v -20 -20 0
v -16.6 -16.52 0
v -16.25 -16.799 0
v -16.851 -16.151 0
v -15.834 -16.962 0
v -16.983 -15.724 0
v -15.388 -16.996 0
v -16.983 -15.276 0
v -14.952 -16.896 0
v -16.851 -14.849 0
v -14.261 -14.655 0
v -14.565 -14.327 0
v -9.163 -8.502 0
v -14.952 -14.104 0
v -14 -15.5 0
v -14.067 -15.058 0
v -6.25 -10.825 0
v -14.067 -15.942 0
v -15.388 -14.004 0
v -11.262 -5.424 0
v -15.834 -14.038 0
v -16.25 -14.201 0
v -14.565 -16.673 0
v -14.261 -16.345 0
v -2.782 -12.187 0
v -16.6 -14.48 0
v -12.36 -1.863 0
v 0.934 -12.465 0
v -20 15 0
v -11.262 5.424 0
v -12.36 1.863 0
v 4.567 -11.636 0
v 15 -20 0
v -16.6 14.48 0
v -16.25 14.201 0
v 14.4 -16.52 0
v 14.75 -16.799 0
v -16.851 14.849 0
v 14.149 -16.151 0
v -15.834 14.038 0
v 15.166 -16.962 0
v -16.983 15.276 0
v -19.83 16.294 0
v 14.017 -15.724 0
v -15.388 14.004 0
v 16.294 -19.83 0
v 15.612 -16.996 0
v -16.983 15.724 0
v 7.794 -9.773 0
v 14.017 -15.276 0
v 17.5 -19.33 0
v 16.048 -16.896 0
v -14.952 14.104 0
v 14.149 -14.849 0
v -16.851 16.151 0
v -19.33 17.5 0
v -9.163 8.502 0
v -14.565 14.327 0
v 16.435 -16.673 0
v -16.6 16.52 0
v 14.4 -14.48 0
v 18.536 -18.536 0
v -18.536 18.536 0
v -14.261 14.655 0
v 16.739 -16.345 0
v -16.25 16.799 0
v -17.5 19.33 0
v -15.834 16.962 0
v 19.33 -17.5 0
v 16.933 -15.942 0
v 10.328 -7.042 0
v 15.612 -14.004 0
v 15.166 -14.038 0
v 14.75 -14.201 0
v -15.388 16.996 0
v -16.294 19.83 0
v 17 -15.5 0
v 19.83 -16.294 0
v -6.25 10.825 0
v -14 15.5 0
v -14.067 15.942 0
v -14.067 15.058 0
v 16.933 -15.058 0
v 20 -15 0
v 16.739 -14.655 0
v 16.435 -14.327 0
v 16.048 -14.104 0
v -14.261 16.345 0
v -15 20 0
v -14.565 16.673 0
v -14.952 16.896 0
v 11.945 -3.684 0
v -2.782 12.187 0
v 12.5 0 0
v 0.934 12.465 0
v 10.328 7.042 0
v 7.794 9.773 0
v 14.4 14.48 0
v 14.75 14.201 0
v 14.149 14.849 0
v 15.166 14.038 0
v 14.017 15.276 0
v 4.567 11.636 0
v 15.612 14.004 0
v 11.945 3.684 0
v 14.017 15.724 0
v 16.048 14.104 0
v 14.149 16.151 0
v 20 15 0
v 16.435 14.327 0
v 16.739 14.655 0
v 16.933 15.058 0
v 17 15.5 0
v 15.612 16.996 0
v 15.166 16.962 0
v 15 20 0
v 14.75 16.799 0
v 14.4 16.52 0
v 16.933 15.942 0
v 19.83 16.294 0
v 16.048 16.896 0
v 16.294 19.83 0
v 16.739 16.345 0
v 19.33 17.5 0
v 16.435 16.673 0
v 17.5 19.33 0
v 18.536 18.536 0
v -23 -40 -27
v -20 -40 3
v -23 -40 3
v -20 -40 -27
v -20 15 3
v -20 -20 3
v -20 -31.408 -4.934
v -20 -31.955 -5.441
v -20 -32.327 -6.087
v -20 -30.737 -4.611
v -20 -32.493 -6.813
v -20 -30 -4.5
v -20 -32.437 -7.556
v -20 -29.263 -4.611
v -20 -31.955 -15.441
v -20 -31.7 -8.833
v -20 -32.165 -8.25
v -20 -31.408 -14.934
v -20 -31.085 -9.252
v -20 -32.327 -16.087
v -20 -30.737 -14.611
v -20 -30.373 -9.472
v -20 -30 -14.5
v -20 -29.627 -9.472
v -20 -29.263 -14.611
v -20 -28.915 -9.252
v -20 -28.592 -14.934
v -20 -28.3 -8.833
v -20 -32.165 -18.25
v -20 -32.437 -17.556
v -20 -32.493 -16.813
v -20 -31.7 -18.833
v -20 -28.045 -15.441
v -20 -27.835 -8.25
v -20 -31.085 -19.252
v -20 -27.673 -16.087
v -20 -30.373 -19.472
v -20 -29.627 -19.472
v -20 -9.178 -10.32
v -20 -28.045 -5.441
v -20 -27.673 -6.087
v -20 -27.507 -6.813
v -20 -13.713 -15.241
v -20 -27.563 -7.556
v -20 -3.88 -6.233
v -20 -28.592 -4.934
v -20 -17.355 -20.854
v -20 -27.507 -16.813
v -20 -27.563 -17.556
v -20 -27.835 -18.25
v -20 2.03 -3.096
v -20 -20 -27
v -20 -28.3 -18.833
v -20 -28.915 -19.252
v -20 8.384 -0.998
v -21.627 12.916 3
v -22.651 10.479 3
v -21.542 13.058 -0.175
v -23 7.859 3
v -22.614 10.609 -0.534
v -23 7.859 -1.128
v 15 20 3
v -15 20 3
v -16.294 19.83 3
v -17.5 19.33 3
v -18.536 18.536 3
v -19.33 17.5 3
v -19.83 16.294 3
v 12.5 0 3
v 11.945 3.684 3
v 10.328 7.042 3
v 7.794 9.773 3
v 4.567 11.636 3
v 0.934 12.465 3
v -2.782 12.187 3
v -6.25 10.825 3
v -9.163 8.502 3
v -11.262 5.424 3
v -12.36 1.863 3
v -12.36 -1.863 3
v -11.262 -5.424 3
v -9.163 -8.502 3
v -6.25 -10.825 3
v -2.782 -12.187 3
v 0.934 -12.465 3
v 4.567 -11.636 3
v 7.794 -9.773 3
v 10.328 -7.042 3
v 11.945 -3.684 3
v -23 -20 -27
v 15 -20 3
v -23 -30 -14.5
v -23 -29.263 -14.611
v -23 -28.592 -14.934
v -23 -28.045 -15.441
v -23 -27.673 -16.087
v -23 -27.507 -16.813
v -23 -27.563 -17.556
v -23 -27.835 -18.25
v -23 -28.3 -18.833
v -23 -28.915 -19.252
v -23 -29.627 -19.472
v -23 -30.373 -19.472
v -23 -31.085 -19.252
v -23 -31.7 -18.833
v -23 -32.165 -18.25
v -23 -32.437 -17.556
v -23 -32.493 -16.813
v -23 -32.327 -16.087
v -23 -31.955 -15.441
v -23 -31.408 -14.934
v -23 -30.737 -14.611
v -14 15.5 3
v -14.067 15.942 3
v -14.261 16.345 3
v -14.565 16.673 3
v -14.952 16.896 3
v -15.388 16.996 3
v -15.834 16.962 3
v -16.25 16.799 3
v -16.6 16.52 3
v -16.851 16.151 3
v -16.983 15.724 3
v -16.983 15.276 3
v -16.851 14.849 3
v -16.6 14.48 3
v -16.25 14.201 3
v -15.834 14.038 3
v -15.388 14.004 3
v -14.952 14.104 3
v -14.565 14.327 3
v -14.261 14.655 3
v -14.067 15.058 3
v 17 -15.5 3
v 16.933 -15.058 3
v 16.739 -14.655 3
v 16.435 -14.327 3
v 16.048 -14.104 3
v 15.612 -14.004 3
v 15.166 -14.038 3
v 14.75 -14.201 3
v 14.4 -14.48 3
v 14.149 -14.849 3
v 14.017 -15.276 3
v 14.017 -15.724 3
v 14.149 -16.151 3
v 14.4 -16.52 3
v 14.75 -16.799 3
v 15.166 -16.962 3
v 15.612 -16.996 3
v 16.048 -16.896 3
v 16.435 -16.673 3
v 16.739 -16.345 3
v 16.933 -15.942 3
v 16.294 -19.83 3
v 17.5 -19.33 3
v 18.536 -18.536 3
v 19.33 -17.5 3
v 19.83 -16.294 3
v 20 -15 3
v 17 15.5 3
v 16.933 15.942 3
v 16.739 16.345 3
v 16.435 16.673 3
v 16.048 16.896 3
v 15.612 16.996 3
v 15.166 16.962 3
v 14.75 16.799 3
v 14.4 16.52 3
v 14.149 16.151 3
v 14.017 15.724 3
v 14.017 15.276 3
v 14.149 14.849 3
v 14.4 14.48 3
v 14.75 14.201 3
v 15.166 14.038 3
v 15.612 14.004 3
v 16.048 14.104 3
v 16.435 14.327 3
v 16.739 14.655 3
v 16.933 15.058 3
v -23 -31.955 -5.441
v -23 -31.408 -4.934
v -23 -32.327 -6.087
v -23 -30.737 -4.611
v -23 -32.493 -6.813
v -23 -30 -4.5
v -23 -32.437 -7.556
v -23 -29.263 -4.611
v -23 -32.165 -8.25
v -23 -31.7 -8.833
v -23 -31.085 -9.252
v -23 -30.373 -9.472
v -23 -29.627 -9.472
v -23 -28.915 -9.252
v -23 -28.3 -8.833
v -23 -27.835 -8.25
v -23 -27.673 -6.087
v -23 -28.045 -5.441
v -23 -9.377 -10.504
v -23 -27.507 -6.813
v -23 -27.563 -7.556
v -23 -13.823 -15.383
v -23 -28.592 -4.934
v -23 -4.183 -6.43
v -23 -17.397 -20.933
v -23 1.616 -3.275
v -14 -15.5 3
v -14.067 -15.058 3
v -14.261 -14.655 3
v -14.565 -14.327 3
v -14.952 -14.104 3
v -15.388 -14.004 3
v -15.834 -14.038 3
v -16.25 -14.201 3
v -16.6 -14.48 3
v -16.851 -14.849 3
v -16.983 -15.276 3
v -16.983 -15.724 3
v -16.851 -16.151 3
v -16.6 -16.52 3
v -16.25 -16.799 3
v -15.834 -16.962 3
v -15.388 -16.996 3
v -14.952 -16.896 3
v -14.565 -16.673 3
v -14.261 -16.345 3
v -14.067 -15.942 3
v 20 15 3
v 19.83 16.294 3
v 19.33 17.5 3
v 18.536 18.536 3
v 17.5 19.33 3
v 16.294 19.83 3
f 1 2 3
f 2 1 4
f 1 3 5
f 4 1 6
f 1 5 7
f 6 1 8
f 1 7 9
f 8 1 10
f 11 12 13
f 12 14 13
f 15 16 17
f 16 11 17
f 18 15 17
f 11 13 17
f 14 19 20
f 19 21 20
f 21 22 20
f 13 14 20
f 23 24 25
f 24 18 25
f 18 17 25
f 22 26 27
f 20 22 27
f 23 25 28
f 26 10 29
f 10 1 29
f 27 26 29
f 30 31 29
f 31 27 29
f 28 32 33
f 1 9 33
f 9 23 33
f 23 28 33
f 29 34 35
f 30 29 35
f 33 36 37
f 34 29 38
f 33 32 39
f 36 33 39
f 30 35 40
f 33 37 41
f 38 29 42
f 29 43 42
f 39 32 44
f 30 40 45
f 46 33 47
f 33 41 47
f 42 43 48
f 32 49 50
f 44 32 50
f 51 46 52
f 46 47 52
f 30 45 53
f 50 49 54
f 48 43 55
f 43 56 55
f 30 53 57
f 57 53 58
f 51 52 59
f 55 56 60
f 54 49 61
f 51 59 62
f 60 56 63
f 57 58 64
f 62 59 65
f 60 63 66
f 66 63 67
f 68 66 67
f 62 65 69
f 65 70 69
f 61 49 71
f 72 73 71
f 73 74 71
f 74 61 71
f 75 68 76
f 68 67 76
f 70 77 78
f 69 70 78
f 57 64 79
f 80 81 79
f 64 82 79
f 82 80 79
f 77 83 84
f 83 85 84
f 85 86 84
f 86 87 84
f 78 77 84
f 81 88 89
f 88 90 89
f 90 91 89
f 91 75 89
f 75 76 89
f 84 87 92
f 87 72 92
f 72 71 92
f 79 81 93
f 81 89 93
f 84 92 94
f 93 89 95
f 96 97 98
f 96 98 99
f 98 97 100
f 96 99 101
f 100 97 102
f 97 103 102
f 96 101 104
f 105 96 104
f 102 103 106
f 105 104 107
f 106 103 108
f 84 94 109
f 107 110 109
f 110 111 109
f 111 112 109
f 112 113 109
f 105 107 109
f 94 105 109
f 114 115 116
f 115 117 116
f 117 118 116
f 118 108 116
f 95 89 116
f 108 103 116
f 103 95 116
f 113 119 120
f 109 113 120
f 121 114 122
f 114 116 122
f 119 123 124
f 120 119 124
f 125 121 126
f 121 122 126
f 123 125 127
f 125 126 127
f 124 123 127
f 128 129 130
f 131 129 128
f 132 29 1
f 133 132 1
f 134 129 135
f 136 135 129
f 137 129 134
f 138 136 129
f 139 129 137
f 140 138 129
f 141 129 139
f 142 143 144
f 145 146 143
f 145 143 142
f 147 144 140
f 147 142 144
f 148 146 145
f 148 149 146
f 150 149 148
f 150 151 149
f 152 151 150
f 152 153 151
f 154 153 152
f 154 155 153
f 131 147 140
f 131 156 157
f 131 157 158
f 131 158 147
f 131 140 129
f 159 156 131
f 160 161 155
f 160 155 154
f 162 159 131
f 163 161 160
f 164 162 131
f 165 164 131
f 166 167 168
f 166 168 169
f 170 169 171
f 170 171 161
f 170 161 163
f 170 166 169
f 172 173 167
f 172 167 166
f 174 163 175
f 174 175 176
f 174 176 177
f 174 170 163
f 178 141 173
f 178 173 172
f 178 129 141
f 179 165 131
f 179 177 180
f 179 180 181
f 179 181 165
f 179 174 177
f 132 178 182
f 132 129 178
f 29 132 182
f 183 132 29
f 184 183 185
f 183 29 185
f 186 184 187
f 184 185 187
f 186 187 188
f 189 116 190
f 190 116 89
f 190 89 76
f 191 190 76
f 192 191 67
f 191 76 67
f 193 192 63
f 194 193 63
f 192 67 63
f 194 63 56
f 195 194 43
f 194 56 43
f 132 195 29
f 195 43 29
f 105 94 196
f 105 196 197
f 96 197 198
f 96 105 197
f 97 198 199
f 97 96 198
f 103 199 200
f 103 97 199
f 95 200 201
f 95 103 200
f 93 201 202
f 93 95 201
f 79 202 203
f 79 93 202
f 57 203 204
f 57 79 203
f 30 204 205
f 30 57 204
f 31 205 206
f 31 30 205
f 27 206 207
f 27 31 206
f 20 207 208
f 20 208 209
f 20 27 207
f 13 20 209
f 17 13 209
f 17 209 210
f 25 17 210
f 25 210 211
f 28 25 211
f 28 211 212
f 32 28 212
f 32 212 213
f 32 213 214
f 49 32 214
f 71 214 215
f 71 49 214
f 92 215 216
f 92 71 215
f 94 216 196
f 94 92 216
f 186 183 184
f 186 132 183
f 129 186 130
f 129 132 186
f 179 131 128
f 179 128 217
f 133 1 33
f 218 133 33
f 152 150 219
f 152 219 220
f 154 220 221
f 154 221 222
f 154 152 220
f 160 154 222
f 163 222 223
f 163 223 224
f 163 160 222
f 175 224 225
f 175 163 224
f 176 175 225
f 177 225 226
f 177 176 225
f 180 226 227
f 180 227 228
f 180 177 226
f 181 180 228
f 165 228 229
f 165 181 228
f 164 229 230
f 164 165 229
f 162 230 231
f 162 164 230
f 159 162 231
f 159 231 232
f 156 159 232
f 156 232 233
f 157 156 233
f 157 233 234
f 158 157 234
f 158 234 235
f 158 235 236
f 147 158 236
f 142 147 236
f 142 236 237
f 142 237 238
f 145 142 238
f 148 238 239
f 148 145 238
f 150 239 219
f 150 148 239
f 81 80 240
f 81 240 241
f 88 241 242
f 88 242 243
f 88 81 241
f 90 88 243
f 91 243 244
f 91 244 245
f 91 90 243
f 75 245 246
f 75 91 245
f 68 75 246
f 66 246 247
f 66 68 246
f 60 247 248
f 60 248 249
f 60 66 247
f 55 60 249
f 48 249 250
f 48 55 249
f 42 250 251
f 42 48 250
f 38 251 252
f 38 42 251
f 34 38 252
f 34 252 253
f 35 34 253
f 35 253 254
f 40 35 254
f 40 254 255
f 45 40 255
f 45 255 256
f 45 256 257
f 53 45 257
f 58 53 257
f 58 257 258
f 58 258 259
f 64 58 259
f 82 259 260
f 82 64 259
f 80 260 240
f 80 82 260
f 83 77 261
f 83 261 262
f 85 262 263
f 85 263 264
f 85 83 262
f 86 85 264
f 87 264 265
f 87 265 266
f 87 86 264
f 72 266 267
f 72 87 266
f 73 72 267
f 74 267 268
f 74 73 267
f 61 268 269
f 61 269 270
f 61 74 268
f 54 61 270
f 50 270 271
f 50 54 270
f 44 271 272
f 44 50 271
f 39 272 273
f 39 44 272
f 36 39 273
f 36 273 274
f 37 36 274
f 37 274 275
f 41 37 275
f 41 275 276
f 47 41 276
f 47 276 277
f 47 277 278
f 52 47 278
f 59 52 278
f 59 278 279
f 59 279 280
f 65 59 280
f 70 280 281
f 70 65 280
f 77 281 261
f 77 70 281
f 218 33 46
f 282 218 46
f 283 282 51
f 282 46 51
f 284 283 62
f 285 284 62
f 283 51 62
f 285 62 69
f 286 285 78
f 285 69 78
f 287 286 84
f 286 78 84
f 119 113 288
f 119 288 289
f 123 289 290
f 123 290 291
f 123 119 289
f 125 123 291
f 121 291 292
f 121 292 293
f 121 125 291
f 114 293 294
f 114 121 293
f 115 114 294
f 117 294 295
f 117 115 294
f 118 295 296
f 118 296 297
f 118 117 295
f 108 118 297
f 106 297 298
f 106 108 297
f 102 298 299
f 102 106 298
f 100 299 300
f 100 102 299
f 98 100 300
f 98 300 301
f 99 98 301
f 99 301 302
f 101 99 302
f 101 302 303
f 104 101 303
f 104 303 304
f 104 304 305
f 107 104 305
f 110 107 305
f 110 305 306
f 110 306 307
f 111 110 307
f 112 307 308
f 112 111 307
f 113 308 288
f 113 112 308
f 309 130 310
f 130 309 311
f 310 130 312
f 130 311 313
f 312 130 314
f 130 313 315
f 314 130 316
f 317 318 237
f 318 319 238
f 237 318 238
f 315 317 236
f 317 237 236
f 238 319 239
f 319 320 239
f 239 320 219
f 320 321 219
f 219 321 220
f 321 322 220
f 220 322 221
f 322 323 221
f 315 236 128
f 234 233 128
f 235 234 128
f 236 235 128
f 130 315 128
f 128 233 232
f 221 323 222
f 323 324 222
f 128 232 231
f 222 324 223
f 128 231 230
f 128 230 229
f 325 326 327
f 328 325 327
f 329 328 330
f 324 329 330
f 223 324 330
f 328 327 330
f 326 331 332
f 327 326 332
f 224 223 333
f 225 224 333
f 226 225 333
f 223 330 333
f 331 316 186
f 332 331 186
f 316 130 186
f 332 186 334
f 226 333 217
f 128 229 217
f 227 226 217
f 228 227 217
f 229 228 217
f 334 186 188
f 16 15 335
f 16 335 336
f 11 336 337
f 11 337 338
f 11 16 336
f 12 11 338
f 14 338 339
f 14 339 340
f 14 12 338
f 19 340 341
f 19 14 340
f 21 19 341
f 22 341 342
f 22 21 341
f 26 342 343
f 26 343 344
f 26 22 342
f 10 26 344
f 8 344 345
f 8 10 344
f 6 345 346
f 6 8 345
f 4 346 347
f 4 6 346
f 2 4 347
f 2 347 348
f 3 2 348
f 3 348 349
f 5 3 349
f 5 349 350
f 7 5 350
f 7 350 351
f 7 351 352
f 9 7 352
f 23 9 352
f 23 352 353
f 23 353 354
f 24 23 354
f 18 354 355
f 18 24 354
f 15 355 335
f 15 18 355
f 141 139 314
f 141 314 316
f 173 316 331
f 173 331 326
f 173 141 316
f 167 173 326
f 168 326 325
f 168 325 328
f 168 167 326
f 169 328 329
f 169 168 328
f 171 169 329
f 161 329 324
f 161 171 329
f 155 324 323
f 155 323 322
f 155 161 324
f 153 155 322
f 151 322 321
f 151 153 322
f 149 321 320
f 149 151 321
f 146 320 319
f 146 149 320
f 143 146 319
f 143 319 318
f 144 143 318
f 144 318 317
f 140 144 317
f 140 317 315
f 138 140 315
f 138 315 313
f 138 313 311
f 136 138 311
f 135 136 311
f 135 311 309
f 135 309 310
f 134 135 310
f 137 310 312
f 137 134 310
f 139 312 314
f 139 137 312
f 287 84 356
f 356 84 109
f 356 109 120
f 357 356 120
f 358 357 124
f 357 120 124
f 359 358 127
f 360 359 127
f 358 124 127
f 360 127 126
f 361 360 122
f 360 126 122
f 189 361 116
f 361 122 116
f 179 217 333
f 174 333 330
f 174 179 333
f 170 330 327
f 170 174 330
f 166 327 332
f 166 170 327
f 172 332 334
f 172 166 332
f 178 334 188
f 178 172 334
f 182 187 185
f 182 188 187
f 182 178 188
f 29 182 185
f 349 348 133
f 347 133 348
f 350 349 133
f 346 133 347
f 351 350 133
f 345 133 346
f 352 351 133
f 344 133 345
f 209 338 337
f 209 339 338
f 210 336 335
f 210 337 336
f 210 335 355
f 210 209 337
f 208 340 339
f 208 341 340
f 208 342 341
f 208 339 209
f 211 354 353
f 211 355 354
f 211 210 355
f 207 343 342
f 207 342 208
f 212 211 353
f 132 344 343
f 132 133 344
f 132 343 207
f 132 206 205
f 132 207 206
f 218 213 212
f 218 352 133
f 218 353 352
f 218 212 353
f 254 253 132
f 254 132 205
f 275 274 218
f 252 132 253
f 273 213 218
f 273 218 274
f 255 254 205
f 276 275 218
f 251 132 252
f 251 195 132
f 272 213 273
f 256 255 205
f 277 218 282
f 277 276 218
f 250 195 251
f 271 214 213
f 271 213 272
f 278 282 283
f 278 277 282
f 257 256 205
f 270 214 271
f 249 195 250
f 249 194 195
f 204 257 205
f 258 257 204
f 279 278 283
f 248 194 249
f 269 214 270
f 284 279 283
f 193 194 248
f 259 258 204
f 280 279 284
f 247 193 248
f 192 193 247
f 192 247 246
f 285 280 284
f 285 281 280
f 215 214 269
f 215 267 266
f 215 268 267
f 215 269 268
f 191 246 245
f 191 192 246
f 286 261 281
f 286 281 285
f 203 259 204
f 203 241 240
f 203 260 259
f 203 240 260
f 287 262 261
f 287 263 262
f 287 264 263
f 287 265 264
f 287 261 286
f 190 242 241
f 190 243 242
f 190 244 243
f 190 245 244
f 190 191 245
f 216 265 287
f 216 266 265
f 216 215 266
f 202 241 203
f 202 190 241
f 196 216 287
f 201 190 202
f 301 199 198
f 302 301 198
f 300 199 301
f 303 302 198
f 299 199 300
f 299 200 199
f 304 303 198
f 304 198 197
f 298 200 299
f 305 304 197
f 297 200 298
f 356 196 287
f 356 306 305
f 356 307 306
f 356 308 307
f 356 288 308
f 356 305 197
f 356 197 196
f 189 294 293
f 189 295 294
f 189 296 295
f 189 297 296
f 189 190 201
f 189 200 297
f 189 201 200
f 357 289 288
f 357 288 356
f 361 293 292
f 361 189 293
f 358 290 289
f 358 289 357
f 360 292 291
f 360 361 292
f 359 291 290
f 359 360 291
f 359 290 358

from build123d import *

# Parameters (mm, degrees)
SKETCH1_R           = 12.5
SKETCH1_R_2         = 1.5
BOSS_EXTRUDE1_DEPTH = 3
SKETCH2_R           = 2.5
BOSS_EXTRUDE2_DEPTH = 3
FILLET1_R           = 10


with BuildPart() as part:
    # Sketch1 → Boss-Extrude1 (new body)
    with BuildSketch(Plane.XY):
        with BuildLine():
            Line((-15, -20), (15, -20))
            ThreePointArc((15, -20), (18.535533906, -18.535533906), (20, -15))
            Line((20, -15), (20, 15))
            ThreePointArc((20, 15), (18.535533906, 18.535533906), (15, 20))
            Line((15, 20), (-15, 20))
            ThreePointArc((-15, 20), (-18.535533906, 18.535533906), (-20, 15))
            Line((-20, 15), (-20, -15))
            Line((-20, -15), (-20, -20))
            Line((-20, -20), (-15, -20))
        make_face()
        Circle(SKETCH1_R, mode=Mode.SUBTRACT)
        with Locations((-15.5, 15.5)):
            Circle(SKETCH1_R_2, mode=Mode.SUBTRACT)
        with Locations((15.5, 15.5)):
            Circle(SKETCH1_R_2, mode=Mode.SUBTRACT)
        with Locations((-15.5, -15.5)):
            Circle(SKETCH1_R_2, mode=Mode.SUBTRACT)
        with Locations((15.5, -15.5)):
            Circle(SKETCH1_R_2, mode=Mode.SUBTRACT)
    extrude(amount=BOSS_EXTRUDE1_DEPTH)


with BuildPart() as body_2:
    # Sketch2 → Boss-Extrude2 (new body)
    with BuildSketch(Plane.ZY.offset(20)):
        with BuildLine():
            Line((3, -40), (-27, -40))
            Line((-27, -40), (-27, -20))
            ThreePointArc((-27, -20), (-8.164746619, -6.615766894), (0, 15))
            Line((0, 15), (3, 15))
            Line((3, 15), (3, -40))
        make_face()
        with Locations((-17, -30)):
            Circle(SKETCH2_R, mode=Mode.SUBTRACT)
        with Locations((-7, -30)):
            Circle(SKETCH2_R, mode=Mode.SUBTRACT)
    extrude(amount=BOSS_EXTRUDE2_DEPTH)

    # Fillet1
    # the kernel refuses this fillet: 10 mm, written as the material it takes off along each edge
    with BuildSketch(Plane(origin=(-23, 15, -17.853571071), x_dir=(1, 0, 0), z_dir=(0, 0, 1))) as fillet1_piece_1:
        with BuildLine():
            CenterArc((10, -7.141428429), FILLET1_R, 134.427004001, 45.572995999)
            Line((0, -7.141428429), (-0.2, -7.141428429))
            Line((-0.2, -7.141428429), (-0.2, 0))
            Line((-0.2, 0), (0, 0.2))
            ThreePointArc((0, 0.2), (1.5, 0.2), (2.86, 0.142828569))
            Line((2.86, 0.142828569), (3, 0))
        make_face()
    extrude(amount=38.707142143, mode=Mode.SUBTRACT)


solid = Compound([part.part, body_2.part])
